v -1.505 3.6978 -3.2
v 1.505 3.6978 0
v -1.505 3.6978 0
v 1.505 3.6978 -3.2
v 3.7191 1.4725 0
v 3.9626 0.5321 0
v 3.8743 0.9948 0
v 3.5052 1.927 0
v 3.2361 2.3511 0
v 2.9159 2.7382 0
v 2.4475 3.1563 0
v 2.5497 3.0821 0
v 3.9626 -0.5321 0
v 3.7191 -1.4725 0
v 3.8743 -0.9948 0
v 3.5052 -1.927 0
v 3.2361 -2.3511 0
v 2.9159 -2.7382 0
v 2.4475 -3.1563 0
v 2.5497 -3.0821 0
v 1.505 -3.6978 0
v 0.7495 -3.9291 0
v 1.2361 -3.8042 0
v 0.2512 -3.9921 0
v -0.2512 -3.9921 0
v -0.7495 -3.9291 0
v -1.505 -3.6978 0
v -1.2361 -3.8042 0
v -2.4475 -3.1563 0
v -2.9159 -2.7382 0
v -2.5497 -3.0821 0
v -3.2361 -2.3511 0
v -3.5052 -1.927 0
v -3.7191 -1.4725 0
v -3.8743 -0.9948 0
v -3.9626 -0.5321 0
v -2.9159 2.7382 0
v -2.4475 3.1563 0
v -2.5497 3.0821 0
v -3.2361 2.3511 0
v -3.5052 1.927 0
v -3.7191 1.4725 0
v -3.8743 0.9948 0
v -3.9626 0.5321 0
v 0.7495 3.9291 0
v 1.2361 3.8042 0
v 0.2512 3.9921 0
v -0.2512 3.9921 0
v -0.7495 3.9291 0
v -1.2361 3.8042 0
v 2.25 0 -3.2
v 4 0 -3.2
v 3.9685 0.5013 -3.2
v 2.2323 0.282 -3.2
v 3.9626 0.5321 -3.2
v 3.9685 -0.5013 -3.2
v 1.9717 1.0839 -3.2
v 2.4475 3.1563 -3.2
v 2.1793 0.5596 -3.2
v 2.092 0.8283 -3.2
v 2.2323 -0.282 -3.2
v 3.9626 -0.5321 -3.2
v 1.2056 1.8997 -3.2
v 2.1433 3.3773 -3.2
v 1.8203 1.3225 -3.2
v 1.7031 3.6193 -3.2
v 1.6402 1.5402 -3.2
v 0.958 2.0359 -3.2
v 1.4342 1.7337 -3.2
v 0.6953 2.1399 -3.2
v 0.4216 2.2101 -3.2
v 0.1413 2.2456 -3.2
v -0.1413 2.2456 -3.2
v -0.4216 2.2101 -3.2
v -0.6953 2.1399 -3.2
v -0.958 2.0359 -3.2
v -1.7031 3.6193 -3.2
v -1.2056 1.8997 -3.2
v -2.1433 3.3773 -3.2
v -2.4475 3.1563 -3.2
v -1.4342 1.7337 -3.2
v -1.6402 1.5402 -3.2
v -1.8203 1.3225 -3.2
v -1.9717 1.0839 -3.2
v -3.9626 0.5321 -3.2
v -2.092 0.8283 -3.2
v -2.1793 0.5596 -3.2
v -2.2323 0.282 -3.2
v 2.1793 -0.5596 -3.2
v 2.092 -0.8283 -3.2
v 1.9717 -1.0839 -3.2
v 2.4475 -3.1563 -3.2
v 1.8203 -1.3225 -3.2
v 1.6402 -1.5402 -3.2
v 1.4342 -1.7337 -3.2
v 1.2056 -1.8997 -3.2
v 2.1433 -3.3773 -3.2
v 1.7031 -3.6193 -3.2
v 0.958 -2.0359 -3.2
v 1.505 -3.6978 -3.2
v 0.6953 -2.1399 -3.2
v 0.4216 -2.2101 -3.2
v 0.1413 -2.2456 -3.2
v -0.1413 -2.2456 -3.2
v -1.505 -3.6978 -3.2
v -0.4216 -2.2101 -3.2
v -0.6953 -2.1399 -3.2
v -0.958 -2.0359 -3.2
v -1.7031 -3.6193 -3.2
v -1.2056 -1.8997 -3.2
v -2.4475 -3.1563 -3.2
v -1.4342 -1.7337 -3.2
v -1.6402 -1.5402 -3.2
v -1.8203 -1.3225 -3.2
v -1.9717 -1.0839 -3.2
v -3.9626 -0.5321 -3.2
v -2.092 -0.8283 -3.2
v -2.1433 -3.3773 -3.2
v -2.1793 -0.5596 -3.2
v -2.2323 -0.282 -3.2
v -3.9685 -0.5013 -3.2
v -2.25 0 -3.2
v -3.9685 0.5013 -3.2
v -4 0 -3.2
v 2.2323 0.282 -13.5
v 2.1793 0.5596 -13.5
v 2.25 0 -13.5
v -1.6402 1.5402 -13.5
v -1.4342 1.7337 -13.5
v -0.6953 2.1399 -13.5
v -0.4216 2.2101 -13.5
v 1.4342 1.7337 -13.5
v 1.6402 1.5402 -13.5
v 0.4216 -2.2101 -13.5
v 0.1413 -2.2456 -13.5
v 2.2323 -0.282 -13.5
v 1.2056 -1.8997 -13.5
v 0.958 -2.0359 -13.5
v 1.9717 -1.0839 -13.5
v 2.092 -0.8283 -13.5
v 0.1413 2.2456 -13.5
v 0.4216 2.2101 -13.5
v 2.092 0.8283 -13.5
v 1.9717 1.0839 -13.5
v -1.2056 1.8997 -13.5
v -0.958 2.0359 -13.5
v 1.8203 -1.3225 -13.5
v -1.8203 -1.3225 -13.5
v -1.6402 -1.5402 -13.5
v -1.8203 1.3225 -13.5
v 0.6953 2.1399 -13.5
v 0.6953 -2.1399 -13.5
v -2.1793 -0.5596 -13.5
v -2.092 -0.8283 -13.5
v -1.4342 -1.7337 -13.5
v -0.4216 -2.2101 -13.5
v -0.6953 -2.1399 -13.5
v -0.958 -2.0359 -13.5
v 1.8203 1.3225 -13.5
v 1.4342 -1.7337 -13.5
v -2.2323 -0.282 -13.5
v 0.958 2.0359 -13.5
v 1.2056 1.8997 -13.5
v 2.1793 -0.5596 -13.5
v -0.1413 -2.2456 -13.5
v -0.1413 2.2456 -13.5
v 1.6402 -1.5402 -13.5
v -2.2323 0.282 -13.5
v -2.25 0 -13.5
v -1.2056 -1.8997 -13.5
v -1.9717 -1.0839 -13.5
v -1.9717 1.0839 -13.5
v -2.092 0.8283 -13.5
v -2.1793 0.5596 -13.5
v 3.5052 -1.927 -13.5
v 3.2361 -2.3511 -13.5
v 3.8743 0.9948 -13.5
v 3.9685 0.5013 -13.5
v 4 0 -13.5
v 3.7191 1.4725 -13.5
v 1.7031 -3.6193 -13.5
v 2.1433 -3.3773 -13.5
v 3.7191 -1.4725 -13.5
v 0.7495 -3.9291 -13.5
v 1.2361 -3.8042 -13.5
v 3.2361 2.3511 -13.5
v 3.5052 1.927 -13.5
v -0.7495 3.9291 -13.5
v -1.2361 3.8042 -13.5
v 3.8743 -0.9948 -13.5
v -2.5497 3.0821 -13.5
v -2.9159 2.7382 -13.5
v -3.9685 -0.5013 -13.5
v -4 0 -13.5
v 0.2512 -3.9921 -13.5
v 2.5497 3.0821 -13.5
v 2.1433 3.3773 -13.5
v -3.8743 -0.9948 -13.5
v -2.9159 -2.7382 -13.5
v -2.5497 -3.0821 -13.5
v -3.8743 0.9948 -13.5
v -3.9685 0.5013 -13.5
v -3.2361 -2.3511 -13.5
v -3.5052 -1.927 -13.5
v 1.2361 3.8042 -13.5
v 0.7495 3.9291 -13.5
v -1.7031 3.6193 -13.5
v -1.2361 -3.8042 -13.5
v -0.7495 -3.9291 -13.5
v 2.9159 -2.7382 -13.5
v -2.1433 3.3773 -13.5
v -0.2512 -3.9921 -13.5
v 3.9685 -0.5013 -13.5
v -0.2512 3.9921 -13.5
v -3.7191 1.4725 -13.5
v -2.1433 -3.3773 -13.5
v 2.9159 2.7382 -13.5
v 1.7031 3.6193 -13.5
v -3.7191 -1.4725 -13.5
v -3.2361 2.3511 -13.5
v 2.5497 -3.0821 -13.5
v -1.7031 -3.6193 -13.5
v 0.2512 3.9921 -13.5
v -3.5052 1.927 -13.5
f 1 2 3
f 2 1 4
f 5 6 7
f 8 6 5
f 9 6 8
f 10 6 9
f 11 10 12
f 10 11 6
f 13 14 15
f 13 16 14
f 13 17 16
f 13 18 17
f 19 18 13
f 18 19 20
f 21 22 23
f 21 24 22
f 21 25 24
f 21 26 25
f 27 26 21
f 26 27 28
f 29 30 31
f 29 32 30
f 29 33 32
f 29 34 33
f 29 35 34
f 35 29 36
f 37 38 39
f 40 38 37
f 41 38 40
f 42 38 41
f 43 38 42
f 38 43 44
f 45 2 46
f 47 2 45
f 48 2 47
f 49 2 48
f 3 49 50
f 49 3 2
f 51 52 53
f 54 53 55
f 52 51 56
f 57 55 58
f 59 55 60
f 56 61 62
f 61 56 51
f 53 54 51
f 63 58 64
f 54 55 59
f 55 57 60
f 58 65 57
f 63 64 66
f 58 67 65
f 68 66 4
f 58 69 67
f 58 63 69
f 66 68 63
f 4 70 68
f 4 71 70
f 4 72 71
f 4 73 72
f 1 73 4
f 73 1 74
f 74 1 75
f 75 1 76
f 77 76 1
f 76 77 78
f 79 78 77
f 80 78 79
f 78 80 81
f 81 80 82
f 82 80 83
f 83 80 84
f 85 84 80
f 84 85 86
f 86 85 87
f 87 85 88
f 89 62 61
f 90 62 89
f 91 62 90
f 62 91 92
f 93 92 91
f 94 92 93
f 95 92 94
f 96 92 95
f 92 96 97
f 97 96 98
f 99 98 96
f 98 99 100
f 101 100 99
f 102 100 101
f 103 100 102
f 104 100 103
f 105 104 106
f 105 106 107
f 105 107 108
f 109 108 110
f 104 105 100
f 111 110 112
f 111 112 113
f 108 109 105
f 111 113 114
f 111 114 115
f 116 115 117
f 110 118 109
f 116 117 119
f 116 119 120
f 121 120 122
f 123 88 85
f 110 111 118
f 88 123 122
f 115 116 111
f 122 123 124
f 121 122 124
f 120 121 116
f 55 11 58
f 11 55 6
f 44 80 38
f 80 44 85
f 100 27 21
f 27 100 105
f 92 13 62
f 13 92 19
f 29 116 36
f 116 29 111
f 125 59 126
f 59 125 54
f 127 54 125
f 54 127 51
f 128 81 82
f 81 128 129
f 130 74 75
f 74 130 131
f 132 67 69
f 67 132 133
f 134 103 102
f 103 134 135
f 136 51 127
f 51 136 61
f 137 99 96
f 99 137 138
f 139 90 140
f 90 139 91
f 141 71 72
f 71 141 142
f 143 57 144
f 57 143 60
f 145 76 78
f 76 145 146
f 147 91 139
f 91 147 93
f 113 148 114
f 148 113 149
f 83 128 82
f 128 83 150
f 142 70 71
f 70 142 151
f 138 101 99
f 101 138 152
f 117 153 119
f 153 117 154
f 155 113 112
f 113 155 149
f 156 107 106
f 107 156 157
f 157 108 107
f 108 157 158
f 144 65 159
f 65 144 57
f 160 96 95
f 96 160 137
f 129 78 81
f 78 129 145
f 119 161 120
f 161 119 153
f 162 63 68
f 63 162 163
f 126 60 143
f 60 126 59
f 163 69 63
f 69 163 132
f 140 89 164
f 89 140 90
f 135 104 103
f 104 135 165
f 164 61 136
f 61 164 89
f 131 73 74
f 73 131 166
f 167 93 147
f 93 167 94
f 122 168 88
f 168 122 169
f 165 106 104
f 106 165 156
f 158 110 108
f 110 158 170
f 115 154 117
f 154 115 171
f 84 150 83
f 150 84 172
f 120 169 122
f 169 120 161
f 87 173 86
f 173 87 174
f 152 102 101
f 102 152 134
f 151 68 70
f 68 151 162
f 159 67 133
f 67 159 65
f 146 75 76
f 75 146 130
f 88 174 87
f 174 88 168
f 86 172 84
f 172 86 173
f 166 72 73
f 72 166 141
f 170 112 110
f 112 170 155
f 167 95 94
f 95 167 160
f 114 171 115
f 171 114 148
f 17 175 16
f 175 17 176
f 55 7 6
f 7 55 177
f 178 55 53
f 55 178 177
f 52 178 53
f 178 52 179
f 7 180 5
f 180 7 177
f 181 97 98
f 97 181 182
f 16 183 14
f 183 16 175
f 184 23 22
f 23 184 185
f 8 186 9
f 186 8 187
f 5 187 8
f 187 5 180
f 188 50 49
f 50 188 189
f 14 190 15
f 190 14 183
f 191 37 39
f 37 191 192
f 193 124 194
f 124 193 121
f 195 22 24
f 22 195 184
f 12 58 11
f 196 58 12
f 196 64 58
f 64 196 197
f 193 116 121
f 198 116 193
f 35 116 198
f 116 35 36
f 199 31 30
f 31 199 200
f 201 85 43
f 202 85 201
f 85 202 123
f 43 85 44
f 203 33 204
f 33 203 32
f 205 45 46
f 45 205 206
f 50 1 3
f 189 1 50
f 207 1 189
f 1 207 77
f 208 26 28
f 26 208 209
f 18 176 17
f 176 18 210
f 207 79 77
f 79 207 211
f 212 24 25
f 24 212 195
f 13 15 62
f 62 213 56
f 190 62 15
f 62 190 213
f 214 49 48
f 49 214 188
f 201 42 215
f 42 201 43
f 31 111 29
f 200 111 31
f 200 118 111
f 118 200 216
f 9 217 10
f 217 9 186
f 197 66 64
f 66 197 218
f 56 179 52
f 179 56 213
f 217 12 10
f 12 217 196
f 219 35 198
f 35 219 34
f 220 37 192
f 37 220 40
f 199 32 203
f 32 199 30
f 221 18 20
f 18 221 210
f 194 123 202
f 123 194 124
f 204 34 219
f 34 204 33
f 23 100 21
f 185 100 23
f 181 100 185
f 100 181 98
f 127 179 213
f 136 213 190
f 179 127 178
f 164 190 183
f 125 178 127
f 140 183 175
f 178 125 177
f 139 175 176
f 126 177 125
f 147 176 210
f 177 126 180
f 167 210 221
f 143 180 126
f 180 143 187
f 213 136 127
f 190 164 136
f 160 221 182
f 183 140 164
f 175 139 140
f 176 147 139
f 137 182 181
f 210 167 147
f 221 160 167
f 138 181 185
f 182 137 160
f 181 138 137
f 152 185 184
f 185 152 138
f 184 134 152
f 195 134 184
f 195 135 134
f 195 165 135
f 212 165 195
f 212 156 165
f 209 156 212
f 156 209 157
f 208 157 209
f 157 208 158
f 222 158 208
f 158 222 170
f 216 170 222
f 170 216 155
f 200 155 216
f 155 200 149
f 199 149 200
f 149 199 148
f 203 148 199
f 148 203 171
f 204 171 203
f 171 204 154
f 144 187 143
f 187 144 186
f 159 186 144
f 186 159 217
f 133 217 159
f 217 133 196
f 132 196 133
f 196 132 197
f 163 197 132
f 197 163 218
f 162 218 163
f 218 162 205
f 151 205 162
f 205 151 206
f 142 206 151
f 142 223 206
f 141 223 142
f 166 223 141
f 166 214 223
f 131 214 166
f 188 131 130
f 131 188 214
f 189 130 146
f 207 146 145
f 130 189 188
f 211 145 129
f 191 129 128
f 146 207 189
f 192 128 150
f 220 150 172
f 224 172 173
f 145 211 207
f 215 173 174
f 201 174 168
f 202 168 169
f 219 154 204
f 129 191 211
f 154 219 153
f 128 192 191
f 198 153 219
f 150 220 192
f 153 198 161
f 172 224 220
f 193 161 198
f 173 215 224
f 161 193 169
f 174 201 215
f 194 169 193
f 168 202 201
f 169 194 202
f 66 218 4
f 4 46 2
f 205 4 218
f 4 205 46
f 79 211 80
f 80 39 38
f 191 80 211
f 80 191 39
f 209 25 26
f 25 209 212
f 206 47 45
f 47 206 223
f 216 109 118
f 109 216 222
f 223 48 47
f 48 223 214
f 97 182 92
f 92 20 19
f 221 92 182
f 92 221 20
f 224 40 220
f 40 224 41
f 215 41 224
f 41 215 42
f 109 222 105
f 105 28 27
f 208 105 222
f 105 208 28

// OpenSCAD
$fn = 50;

difference() {
	union() {
		translate(v = [0, 0, -13.5]) {
			cylinder(h = 13.5, r = 4.0);
		}
	}
	union() {
		translate(v = [0, 0, 0]) {
			rotate(a = [0, 0, 0]) {
				difference() {
					union() {
						translate(v = [0, 0, -3.2]) {
							linear_extrude(height = 3.2) {
								polygon(points = [[4.2698, 0.0], [2.1349000000000005, 3.697755269078796], [-2.134899999999999, 3.6977552690787965], [-4.2698, 5.228996902999369e-16], [-2.134900000000002, -3.6977552690787956], [2.1348999999999974, -3.697755269078798]]);
							}
						}
					}
					union();
				}
			}
		}
		#translate(v = [0, 0, -100.0]) {
			cylinder(h = 200, r = 2.25);
		}
	}
}
